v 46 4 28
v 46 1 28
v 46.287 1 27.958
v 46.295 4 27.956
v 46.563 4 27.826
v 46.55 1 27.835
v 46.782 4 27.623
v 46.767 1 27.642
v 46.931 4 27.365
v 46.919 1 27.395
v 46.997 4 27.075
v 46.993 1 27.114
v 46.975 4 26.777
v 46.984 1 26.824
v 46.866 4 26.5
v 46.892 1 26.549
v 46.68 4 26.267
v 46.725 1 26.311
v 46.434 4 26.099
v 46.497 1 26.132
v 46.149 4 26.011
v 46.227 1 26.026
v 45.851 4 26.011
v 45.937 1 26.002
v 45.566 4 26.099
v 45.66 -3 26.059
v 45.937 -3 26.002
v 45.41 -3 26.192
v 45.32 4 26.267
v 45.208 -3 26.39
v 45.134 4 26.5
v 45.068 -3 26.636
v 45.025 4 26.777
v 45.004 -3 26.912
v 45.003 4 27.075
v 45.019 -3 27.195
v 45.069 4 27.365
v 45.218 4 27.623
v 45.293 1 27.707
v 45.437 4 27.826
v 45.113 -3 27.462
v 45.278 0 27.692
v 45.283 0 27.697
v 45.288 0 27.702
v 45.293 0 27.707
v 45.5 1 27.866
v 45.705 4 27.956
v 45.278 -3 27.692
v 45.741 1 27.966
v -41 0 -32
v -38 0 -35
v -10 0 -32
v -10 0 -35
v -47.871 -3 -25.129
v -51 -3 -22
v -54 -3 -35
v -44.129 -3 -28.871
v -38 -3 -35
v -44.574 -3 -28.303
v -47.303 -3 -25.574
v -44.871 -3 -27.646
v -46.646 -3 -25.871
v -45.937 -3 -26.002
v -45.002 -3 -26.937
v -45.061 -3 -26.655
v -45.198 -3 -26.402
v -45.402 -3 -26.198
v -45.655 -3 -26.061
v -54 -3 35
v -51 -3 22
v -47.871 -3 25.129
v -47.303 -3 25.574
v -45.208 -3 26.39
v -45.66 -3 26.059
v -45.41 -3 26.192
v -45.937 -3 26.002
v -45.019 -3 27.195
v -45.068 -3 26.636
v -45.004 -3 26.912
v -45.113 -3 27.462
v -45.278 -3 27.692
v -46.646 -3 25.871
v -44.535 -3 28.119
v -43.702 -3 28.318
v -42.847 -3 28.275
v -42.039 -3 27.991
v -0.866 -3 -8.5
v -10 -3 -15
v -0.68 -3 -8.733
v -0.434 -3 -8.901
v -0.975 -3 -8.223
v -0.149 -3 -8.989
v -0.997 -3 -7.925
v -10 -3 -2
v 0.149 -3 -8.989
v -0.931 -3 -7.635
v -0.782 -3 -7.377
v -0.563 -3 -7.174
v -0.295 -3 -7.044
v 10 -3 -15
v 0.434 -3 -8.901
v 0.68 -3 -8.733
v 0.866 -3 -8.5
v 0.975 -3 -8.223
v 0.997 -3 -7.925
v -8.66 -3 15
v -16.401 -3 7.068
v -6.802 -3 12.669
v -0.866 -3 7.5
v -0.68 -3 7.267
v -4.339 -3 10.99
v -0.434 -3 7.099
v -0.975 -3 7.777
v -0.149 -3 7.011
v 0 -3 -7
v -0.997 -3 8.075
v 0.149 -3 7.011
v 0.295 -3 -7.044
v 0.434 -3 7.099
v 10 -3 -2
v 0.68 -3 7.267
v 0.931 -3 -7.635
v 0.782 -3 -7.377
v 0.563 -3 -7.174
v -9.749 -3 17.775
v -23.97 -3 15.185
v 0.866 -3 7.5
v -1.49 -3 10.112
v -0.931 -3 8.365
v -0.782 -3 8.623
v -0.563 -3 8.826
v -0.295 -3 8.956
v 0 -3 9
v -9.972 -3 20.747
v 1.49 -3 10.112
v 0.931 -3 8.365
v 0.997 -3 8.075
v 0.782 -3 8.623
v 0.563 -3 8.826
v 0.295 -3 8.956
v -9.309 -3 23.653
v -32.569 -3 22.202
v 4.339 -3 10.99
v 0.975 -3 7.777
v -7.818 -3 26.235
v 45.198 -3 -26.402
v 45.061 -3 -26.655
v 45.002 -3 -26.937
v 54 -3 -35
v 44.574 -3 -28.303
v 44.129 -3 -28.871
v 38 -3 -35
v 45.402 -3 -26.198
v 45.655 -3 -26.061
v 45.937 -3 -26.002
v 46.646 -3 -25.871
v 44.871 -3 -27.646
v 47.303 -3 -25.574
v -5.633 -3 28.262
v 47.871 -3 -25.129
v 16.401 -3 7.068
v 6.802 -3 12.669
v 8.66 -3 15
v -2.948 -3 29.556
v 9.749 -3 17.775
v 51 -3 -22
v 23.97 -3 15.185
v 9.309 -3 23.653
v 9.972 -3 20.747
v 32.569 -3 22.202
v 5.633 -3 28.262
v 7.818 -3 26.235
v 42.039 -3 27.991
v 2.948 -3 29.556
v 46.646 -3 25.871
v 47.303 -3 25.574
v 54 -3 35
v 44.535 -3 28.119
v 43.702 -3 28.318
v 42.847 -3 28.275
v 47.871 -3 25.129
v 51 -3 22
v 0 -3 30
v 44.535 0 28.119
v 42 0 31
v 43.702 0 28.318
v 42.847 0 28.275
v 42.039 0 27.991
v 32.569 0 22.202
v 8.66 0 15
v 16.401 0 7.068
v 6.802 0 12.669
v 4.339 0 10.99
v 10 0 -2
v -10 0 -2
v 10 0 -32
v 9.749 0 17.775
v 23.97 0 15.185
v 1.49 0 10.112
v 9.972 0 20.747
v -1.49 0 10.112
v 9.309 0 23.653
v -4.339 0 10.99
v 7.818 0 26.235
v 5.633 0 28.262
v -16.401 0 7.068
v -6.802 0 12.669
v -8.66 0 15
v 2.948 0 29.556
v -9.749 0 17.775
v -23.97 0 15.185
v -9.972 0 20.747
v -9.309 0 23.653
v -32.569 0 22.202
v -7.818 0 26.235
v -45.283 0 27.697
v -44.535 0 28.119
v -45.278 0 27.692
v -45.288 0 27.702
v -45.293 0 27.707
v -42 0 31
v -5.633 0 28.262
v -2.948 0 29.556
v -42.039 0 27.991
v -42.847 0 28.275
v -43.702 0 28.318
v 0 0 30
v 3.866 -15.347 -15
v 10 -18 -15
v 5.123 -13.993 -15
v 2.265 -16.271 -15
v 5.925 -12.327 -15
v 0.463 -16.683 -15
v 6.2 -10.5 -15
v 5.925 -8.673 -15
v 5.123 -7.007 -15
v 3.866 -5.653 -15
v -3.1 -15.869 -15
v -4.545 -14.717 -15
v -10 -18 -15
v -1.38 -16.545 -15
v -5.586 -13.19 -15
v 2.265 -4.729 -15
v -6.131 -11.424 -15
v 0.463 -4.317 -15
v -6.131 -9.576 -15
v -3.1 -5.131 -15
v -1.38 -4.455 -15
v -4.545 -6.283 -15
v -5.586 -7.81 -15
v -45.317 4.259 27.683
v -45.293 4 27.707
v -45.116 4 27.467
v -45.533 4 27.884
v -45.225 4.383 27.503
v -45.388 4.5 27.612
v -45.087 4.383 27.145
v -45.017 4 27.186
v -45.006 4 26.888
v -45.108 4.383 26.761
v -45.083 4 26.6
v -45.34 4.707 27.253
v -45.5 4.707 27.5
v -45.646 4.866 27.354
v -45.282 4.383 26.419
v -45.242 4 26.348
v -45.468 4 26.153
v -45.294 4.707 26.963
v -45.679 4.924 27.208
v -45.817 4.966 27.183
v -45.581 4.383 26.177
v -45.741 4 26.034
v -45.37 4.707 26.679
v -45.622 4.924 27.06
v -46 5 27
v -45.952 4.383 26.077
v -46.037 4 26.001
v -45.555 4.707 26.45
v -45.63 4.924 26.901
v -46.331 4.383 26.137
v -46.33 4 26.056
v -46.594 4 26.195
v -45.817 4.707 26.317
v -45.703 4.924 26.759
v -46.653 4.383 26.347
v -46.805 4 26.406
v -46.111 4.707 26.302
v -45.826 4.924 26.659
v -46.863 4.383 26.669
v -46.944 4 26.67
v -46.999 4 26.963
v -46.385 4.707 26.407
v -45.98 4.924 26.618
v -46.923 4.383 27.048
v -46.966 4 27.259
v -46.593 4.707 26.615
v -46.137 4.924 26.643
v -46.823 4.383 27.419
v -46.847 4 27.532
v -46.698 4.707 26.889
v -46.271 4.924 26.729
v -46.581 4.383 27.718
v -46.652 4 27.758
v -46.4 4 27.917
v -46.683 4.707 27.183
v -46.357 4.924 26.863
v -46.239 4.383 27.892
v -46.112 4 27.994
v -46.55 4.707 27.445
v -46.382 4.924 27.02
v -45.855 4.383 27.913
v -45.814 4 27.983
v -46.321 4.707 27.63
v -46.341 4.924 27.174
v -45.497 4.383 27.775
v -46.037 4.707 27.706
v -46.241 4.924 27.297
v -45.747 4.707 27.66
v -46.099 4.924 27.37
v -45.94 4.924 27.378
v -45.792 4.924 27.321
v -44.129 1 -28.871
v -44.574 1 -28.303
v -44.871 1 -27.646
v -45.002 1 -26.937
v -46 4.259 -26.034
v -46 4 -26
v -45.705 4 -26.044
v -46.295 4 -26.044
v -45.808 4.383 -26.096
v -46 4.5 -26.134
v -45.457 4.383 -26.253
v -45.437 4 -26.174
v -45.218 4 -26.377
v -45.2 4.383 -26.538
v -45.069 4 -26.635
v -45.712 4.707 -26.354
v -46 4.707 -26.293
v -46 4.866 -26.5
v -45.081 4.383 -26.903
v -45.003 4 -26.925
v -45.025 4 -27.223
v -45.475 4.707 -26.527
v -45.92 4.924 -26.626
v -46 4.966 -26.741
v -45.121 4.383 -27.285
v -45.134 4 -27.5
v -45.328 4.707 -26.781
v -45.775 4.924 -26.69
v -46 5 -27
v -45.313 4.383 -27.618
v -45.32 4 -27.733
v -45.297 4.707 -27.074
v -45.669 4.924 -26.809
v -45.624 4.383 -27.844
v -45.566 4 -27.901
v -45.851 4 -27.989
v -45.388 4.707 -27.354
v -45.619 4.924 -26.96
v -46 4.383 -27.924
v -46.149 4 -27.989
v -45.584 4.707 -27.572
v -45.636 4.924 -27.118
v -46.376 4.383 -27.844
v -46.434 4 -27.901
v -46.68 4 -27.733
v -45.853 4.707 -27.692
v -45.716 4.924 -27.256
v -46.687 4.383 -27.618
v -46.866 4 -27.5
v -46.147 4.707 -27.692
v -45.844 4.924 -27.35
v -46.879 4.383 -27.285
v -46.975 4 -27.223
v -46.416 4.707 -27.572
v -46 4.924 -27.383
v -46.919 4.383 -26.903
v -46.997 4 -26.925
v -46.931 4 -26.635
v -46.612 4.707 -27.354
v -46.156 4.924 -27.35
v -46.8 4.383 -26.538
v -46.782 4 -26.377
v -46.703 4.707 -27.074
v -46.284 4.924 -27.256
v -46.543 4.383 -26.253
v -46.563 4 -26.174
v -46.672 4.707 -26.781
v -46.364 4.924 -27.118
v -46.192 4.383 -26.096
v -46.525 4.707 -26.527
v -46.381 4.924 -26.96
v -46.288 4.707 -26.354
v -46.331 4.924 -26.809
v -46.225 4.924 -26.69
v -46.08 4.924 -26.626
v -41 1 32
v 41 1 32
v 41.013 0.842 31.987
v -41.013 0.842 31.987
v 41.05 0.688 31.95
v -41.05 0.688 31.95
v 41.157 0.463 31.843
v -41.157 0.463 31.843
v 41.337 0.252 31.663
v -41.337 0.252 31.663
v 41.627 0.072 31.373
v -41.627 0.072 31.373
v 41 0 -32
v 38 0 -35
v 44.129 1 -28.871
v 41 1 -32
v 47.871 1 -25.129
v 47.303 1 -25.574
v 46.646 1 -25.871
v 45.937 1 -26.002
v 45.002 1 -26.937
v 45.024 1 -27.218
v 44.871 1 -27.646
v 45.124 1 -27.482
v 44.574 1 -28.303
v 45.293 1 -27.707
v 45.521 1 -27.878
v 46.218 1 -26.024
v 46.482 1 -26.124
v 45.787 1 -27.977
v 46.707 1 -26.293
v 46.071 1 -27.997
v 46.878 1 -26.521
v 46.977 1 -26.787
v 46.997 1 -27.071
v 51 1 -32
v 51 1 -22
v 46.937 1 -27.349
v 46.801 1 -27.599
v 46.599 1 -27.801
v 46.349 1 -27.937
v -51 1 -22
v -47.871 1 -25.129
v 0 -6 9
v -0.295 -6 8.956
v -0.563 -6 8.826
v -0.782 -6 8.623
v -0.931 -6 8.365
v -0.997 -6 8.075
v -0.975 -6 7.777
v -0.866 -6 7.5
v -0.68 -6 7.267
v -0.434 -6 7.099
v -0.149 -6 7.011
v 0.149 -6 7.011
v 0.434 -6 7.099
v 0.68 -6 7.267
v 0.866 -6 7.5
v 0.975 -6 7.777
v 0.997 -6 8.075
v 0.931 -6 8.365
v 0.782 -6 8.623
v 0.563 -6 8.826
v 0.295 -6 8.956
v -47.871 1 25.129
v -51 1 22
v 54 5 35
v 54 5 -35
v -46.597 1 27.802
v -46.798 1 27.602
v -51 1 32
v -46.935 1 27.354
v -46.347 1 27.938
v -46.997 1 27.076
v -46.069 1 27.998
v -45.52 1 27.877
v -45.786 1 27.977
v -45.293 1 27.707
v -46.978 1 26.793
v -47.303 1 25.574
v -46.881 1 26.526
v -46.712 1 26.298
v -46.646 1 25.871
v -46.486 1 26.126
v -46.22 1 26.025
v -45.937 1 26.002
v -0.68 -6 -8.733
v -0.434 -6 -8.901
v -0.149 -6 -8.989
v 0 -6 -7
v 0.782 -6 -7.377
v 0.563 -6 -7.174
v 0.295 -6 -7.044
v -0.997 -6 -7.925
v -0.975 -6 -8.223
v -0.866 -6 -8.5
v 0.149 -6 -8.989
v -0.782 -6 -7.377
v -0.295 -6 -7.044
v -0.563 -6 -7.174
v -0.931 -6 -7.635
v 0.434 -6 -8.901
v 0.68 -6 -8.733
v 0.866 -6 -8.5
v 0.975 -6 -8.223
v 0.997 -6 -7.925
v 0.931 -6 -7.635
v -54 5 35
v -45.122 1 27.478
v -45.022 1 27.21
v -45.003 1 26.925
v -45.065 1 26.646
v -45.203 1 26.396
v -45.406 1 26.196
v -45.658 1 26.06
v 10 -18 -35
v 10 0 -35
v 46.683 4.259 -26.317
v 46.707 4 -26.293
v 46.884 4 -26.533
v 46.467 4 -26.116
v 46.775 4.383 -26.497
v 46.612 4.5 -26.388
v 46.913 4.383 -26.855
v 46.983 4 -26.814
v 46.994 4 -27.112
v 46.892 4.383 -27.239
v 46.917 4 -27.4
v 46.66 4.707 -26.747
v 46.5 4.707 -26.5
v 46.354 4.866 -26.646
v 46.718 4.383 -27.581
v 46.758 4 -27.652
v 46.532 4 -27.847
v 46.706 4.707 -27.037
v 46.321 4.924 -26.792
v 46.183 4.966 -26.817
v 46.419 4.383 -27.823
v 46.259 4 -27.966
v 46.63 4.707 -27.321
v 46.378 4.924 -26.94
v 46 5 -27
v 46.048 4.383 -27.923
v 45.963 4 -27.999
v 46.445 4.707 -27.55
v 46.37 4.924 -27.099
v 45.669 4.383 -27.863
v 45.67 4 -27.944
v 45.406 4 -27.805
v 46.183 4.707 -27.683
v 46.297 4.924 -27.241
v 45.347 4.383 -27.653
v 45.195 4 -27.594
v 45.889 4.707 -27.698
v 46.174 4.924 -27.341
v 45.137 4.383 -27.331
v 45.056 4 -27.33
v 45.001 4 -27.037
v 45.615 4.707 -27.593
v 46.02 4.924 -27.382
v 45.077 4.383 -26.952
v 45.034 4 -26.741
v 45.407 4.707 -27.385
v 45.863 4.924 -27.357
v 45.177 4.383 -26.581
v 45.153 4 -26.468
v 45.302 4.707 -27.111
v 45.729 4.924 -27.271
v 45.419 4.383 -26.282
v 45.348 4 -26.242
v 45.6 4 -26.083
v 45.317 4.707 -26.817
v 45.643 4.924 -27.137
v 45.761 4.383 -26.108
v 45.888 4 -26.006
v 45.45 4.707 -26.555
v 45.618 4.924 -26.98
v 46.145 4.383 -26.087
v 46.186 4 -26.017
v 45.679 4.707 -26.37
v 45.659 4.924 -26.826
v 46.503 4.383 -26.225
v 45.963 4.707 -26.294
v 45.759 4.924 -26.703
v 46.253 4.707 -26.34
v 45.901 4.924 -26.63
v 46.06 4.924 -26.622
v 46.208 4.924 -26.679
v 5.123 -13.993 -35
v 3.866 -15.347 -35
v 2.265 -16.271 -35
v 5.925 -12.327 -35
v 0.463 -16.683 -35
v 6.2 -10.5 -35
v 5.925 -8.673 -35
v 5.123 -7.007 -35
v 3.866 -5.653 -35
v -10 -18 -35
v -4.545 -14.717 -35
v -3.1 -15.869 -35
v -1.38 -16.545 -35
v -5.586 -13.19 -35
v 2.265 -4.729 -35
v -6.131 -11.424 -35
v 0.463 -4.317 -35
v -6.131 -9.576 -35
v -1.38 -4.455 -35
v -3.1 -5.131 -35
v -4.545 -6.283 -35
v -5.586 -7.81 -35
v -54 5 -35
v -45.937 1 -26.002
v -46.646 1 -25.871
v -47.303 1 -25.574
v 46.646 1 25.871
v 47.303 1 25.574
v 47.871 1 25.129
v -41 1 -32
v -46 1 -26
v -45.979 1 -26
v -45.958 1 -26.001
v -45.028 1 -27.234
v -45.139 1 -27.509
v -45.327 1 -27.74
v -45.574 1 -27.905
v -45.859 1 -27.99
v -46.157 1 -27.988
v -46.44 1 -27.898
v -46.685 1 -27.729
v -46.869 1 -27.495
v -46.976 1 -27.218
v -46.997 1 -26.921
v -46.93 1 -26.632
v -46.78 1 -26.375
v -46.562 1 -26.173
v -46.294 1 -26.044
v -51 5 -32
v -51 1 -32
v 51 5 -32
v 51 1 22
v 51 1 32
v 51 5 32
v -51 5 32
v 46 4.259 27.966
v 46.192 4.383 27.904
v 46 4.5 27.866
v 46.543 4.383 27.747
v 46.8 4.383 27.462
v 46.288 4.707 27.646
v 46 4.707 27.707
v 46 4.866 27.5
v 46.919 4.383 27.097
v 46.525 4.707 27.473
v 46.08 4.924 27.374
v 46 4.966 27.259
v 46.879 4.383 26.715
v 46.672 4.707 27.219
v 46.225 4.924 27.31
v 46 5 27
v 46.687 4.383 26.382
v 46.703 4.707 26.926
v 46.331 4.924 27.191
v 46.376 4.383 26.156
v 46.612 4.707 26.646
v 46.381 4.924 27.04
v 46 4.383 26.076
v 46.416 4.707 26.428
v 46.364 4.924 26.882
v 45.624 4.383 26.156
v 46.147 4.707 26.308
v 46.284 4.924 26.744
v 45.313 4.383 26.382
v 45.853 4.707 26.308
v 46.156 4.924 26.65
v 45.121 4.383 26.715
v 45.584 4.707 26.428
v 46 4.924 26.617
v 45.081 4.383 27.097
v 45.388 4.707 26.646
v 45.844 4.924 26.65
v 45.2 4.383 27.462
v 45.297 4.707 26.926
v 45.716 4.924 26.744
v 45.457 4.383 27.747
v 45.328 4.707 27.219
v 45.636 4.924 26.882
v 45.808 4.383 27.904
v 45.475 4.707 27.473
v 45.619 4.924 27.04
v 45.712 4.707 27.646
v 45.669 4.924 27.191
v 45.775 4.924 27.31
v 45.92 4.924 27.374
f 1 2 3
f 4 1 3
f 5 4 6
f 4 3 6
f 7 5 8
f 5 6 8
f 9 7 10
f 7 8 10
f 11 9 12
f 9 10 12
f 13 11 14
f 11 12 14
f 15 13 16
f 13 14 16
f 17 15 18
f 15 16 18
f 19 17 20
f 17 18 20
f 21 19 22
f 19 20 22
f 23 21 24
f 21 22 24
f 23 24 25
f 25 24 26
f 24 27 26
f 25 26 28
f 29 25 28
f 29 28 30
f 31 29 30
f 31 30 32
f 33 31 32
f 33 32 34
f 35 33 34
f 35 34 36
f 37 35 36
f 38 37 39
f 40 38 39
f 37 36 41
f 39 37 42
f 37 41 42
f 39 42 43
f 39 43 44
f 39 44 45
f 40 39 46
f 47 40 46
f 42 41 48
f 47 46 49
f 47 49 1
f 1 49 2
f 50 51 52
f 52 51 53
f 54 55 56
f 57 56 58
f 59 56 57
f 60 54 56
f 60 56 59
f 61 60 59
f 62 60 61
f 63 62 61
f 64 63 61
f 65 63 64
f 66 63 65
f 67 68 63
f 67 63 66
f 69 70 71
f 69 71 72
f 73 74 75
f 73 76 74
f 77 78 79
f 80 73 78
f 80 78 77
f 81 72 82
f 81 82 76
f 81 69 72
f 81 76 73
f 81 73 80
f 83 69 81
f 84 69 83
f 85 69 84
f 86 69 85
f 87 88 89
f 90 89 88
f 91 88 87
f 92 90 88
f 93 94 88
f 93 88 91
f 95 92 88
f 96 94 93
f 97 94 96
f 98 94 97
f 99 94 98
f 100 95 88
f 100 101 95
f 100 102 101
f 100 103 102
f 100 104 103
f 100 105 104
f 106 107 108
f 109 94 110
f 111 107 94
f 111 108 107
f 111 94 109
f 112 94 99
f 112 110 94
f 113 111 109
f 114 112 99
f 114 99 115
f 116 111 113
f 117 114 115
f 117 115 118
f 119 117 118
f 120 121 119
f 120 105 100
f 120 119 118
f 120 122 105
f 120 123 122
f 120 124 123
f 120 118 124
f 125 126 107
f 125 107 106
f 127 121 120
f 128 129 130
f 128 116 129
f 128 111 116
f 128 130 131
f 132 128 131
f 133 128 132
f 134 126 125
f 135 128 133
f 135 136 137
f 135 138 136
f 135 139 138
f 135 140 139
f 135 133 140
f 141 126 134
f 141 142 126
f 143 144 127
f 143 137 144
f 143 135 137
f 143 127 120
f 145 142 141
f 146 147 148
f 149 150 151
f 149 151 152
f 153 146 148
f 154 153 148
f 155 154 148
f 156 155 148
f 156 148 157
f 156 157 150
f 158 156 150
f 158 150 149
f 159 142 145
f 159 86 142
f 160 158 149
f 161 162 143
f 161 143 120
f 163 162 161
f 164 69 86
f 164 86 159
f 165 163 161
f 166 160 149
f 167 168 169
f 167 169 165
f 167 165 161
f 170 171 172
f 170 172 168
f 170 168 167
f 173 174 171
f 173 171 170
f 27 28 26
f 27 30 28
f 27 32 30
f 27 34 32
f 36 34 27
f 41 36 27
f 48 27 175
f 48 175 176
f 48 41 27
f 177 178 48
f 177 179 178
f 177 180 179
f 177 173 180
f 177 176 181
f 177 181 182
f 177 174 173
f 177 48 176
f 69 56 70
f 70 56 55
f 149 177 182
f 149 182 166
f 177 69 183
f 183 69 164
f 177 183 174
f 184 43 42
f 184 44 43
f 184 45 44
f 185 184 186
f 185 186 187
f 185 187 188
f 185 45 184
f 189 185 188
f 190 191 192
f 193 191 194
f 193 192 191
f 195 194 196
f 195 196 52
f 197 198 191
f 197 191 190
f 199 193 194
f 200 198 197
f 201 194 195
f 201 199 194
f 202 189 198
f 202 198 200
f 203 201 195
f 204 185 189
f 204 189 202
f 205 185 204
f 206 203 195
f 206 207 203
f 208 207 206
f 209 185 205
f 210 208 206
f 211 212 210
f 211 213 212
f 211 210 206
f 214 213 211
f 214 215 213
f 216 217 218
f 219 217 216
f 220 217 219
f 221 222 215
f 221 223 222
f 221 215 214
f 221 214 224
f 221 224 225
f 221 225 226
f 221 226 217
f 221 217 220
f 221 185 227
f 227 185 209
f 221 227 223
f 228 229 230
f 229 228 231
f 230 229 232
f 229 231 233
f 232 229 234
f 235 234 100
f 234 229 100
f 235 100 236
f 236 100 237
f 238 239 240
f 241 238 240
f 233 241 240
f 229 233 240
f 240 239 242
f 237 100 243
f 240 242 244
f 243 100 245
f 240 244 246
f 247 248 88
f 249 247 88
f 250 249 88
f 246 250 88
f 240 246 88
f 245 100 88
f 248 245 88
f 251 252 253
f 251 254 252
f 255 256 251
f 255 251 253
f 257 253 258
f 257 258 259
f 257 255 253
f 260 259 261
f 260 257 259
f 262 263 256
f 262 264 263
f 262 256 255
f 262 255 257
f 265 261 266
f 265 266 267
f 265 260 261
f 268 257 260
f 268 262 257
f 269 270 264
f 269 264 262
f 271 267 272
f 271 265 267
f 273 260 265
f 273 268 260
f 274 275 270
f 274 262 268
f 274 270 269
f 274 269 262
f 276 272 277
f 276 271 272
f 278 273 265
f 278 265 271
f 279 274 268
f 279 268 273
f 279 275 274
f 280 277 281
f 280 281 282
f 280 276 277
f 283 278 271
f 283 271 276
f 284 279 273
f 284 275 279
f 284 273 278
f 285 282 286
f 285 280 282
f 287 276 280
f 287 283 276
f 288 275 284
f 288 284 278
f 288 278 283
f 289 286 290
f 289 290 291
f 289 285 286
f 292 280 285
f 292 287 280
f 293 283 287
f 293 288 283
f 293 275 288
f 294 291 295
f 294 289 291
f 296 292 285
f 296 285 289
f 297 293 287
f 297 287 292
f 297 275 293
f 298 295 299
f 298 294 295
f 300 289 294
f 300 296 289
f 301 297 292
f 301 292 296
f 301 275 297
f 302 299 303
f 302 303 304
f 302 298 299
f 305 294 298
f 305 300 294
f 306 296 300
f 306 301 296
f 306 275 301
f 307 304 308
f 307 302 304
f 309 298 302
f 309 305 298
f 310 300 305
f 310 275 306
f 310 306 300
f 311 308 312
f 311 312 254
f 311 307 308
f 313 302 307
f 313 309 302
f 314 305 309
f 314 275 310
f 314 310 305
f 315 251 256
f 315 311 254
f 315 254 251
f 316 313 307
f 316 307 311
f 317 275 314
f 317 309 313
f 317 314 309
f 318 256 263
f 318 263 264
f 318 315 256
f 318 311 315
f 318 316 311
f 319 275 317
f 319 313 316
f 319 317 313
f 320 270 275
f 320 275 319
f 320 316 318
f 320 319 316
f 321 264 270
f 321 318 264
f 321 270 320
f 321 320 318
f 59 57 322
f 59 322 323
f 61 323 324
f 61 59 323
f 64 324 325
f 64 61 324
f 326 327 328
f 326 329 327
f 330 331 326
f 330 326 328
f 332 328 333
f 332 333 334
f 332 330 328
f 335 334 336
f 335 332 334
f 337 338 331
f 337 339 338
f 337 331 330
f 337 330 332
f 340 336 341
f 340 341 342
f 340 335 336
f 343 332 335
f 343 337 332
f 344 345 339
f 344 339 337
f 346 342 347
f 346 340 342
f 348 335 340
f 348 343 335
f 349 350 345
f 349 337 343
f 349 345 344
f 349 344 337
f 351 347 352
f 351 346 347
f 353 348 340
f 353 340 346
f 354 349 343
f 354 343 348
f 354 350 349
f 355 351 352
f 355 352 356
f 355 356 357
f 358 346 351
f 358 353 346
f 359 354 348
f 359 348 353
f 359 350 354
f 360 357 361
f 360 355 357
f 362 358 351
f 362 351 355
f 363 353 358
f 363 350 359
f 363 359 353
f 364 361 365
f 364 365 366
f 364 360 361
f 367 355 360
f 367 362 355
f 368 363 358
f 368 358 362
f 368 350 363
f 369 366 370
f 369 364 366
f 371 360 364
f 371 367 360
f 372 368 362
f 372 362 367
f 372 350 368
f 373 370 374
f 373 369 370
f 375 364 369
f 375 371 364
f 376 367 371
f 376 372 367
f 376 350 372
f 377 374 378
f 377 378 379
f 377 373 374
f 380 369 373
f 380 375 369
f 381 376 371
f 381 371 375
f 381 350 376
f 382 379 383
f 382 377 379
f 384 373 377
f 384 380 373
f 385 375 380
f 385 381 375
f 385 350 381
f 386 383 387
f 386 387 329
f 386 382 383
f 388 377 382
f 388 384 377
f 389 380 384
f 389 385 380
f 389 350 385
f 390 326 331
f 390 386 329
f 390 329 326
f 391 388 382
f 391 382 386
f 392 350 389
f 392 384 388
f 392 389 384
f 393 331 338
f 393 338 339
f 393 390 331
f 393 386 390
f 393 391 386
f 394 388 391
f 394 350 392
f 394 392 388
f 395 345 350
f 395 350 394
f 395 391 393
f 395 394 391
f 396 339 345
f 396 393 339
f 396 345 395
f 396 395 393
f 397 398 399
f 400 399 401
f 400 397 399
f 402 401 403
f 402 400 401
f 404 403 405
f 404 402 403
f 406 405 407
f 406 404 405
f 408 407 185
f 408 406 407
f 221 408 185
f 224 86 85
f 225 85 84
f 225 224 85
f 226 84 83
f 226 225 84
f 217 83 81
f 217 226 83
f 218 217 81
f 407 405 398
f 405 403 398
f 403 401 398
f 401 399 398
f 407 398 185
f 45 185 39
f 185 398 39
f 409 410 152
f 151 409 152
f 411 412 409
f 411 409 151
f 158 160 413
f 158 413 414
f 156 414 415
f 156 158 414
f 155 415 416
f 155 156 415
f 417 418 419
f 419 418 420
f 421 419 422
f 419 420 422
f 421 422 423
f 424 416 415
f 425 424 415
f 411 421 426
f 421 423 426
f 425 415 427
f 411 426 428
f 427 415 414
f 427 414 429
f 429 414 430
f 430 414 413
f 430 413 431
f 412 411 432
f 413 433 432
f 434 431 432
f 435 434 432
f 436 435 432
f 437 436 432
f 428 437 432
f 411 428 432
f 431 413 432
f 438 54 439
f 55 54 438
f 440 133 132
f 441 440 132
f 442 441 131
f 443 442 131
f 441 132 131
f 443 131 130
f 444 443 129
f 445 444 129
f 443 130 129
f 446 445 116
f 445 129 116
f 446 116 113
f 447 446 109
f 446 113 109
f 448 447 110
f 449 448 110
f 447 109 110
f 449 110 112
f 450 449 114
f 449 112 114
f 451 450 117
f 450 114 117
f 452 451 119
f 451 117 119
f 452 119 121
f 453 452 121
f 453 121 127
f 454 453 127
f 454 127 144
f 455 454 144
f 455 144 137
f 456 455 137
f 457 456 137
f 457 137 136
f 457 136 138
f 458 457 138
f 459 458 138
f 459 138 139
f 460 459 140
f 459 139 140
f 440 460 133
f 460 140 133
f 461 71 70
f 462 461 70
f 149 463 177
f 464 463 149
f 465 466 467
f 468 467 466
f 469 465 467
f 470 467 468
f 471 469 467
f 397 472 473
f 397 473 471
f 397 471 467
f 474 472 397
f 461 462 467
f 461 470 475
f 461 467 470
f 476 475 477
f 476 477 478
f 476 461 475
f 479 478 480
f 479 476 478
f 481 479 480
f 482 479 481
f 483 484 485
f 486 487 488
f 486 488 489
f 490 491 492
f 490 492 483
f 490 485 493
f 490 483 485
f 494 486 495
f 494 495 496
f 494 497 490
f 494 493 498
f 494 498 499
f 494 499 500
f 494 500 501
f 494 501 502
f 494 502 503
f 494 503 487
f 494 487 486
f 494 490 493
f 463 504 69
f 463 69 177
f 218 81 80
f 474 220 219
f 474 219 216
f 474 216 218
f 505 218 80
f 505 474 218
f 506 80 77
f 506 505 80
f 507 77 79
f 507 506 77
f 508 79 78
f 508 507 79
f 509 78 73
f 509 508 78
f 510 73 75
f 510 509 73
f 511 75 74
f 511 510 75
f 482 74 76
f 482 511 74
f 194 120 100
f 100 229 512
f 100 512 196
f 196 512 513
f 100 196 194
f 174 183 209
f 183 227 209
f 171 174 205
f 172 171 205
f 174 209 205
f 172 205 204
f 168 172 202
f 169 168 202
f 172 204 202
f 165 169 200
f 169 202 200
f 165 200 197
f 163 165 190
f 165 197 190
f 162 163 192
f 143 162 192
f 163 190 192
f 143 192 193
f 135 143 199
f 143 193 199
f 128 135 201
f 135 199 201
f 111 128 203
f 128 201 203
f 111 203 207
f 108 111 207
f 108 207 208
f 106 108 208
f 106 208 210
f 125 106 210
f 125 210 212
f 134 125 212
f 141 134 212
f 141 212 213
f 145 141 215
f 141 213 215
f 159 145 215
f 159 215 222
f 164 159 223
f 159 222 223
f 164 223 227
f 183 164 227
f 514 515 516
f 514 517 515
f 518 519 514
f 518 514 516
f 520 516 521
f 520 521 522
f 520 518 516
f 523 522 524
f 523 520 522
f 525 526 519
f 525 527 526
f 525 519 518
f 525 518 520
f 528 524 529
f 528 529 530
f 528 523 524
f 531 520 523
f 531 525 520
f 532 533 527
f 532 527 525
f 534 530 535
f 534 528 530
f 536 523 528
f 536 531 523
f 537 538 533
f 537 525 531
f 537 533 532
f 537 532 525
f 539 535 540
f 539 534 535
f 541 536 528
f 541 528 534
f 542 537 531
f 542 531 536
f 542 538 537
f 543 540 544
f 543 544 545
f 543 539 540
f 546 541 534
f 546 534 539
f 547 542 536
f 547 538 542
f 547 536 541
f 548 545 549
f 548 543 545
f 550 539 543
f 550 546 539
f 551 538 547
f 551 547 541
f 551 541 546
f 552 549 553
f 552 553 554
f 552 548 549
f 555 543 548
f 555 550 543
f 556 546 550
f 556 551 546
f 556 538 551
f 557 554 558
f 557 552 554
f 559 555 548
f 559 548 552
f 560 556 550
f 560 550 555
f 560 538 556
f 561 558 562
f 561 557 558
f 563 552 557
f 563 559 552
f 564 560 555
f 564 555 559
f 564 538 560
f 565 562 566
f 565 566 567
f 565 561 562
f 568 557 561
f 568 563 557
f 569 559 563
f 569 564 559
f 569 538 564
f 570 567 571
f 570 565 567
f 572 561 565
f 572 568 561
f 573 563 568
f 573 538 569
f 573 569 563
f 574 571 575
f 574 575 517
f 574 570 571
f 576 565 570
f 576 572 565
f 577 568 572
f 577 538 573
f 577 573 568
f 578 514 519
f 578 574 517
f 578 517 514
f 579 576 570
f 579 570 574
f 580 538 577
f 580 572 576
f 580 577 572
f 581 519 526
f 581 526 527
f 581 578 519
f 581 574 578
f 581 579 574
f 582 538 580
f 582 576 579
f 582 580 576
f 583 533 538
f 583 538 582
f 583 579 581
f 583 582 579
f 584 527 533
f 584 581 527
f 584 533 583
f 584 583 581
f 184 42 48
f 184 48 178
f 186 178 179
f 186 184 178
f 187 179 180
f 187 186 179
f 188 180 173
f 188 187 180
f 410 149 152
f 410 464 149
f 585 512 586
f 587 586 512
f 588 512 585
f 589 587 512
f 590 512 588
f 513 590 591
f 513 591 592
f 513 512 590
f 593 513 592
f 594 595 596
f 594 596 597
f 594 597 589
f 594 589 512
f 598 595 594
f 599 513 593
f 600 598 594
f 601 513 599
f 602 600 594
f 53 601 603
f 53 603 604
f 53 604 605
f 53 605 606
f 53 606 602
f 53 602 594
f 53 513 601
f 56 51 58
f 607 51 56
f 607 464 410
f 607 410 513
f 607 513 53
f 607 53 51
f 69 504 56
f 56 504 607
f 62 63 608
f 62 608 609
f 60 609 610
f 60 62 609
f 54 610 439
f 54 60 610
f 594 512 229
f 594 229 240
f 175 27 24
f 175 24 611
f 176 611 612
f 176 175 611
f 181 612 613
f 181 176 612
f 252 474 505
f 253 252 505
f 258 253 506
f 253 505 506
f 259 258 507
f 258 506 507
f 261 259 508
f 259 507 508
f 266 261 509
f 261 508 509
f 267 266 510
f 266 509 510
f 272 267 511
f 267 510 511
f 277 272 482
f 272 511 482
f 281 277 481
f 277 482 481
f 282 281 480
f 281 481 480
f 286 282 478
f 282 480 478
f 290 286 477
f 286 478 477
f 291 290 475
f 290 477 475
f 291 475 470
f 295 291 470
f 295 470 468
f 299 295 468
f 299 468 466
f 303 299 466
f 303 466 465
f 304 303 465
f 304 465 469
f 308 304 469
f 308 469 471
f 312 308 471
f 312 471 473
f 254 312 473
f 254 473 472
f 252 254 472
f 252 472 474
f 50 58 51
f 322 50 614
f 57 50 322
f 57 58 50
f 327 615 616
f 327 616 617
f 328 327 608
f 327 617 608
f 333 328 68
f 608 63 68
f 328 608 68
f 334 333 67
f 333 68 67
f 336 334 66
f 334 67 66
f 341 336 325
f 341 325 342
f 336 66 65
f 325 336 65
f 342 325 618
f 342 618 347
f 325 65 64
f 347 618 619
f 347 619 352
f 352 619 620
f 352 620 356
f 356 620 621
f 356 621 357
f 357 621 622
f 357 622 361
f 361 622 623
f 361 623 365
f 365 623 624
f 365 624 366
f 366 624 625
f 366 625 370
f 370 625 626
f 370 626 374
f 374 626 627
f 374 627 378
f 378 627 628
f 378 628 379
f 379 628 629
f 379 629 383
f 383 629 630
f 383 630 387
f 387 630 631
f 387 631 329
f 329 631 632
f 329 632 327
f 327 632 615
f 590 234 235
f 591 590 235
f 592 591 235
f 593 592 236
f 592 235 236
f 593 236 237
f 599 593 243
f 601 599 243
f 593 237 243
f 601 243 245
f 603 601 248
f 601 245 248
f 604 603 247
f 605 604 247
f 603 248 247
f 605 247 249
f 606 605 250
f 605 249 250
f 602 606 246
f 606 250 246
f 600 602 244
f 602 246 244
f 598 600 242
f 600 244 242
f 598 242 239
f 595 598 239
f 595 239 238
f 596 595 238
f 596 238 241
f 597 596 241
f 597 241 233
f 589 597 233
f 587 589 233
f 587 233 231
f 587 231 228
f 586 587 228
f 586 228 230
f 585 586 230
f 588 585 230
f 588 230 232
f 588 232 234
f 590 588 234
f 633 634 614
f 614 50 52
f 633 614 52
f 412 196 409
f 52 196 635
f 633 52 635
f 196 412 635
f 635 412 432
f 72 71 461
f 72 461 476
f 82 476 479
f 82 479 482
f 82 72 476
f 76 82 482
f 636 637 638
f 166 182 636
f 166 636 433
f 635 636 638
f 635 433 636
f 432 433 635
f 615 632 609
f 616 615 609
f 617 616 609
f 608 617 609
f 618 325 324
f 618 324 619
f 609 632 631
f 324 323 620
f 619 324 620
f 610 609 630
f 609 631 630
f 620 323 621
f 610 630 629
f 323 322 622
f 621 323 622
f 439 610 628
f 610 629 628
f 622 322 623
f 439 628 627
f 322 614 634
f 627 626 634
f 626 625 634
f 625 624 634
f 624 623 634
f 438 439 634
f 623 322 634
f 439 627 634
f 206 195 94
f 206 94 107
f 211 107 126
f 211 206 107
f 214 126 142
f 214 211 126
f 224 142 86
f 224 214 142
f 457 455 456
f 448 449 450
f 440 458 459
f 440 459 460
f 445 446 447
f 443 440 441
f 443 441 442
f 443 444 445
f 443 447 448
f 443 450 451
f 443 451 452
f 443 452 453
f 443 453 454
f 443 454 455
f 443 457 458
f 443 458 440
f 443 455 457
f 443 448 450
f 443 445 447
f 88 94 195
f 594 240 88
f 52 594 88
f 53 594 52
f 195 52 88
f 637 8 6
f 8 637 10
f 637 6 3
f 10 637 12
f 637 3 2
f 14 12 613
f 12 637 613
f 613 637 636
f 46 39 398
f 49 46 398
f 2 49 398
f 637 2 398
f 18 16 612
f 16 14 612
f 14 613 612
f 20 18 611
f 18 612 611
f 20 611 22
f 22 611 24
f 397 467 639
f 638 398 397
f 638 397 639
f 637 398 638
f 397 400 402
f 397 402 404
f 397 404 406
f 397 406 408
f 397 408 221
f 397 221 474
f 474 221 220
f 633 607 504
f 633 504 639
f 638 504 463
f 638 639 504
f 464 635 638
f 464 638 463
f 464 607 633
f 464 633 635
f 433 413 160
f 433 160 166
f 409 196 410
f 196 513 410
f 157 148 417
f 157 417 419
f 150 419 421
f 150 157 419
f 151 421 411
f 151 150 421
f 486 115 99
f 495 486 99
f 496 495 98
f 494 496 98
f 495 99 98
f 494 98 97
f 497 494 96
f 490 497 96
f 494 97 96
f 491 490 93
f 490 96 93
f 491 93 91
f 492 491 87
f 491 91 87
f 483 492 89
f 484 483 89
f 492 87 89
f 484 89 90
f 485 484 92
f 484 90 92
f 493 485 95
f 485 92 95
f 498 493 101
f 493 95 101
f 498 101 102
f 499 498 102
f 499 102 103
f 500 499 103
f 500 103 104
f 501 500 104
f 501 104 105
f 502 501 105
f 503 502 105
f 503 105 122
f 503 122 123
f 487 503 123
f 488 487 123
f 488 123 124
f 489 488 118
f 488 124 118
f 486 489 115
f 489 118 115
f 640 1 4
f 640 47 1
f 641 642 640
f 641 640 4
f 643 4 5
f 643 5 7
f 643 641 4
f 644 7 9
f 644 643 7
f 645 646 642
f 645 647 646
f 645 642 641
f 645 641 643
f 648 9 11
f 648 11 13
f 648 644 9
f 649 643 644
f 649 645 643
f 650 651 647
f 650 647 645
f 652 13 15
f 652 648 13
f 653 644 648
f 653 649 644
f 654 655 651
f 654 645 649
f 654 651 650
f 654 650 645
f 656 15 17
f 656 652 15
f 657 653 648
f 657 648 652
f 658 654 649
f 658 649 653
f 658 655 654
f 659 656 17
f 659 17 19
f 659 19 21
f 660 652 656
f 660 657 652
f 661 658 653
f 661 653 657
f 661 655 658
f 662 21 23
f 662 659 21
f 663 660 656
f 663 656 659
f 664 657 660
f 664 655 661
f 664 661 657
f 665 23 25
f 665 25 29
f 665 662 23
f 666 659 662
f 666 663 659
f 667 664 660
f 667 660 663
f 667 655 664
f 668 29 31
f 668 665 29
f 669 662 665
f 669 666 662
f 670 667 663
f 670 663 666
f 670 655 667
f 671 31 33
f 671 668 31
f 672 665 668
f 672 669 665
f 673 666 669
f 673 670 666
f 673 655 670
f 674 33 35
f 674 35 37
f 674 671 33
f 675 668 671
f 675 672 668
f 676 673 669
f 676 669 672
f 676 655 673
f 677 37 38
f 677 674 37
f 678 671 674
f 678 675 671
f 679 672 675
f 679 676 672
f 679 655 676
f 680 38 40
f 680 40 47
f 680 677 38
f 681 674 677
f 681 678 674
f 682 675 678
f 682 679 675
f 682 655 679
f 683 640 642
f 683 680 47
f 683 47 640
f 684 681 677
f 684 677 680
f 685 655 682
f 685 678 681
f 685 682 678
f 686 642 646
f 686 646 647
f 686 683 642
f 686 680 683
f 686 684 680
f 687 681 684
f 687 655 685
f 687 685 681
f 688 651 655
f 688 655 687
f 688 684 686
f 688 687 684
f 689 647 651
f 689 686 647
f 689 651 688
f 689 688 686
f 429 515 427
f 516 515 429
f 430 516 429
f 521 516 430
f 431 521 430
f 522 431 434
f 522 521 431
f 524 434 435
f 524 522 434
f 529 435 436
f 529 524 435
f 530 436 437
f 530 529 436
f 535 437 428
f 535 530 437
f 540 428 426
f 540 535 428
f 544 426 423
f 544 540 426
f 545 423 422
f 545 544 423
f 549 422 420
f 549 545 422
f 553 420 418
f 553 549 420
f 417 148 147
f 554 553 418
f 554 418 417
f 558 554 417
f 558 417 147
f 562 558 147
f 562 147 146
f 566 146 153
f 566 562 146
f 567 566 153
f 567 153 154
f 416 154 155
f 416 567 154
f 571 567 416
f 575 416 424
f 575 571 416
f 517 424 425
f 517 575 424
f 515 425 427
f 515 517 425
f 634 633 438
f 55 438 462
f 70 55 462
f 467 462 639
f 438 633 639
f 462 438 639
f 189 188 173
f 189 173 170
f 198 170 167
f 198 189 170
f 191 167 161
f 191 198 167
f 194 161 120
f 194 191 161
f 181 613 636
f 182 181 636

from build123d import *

# Parameters (mm, degrees)
SKETCH_1_W          = 108
SKETCH_1_H          = 70
SKETCH_1_W_2        = 102
SKETCH_1_H_2        = 64
EXTRUDE_1_DEPTH     = 5
EXTRUDE_8_DEPTH     = 3
SKETCH_4_W          = 20
SKETCH_4_H          = 18
EXTRUDE_9_DEPTH     = 20
SKETCH_5_R          = 6.2
CUT_EXTRUDE_1_DEPTH = 76.7627877
FILLET_2_R          = 1
EXTRUDE_10_DEPTH    = 1
EXTRUDE_11_DEPTH    = 3
FILLET_3_R          = 3
SKETCH_8_R          = 10
CUT_EXTRUDE_2_DEPTH = 5
SKETCH_9_R          = 1
EXTRUDE_12_DEPTH    = 4
FILLET_4_R          = 3
FILLET_5_R          = 1
EXTRUDE_13_DEPTH    = 3
SKETCH_12_R         = 1
EXTRUDE_15_DEPTH    = 3


with BuildPart() as part:
    # 草图1 → 凸台-拉伸1 (new body)
    with BuildSketch(Plane(origin=(0, 0, 0), x_dir=(1, 0, 0), z_dir=(0, 1, 0))):
        Rectangle(SKETCH_1_W, SKETCH_1_H)
        Rectangle(SKETCH_1_W_2, SKETCH_1_H_2, mode=Mode.SUBTRACT)
    extrude(amount=EXTRUDE_1_DEPTH)

    # 草图3 → 凸台-拉伸8 (add)
    with BuildSketch(Plane.XZ):
        with BuildLine():
            Line((10, -35), (-10, -35))
            Line((-10, -35), (-10, -2))
            ThreePointArc((-10, -2), (-28.889417714, 19.435738798), (-54, 33.065106234))
            Line((-54, 33.065106234), (-54, 35))
            Line((-54, 35), (54, 35))
            Line((54, 35), (54, 33.065106234))
            ThreePointArc((54, 33.065106234), (28.889417714, 19.435738798), (10, -2))
            Line((10, -2), (10, -35))
        make_face()
    extrude(amount=EXTRUDE_8_DEPTH)

    # 草图4 → 凸台-拉伸9 (add)
    with BuildSketch(Plane(origin=(0, 0, -35), x_dir=(-1, 0, 0), z_dir=(0, 0, -1))):
        with Locations((0, -9)):
            Rectangle(SKETCH_4_W, SKETCH_4_H)
    extrude(amount=-EXTRUDE_9_DEPTH)

    # 草图5 → 切除-拉伸1 (cut, through all)
    with BuildSketch(Plane.XY.offset(-15)):
        with Locations((0, -10.5)):
            Circle(SKETCH_5_R)
    extrude(amount=-CUT_EXTRUDE_1_DEPTH, mode=Mode.SUBTRACT)

    # 圆角2
    # the kernel refuses this fillet: 1 mm, written as the material it adds along each edge
    with BuildSketch(Plane(origin=(-53.5, 0, 32), x_dir=(0, 1, 0), z_dir=(1, 0, 0))) as fillet_2_piece_1:
        with BuildLine():
            CenterArc((FILLET_2_R, -FILLET_2_R), FILLET_2_R, 90, 90)
            Line((0, -FILLET_2_R), (0, 0))
            Line((0, 0), (FILLET_2_R, 0))
        make_face()
    extrude(amount=107)

    # 草图6 → 凸台-拉伸10 (add)
    with BuildSketch(Plane(origin=(0, 0, 0), x_dir=(1, 0, 0), z_dir=(0, 1, 0))):
        Polygon((51, 32), (41, 32), (51, 22), align=None)
        Polygon((-51, 32), (-41, 32), (-51, 22), align=None)
        Polygon((-51, -22), (-51, -32), (-41, -32), align=None)
        Polygon((51, -32), (41, -32), (51, -22), align=None)
    extrude(amount=EXTRUDE_10_DEPTH)

    # 草图7 → 凸台-拉伸11 (add)
    with BuildSketch(Plane.XZ):
        Polygon((38, -35), (54, -19), (54, -35), align=None)
        Polygon((-54, -35), (-38, -35), (-54, -19), align=None)
        Polygon((54, 35), (38, 35), (54, 19), align=None)
        Polygon((-54, 35), (-38, 35), (-54, 19), align=None)
    extrude(amount=EXTRUDE_11_DEPTH)

    # 圆角3
    fillet_3_edges = [part.edges().sort_by_distance(p)[0] for p in [
        (44.013135699, -1.5, 28.986864301),
        (-44.013135699, -1.5, 28.986864301),
    ]]
    fillet(fillet_3_edges, radius=FILLET_3_R)

    # 草图8 → 切除-拉伸2 (cut, symmetric)
    with BuildSketch(Plane(origin=(0, 0, 0), x_dir=(1, 0, 0), z_dir=(0, 1, 0))):
        with Locations(Location((0, -20, 0), (0, 0, 270))):
            Circle(SKETCH_8_R)
    extrude(amount=CUT_EXTRUDE_2_DEPTH, both=True, mode=Mode.SUBTRACT)

    # 草图9 → 凸台-拉伸12 (add, symmetric)
    with BuildSketch(Plane(origin=(0, 1, 0), x_dir=(1, 0, 0), z_dir=(0, 1, 0))):
        with Locations(Location((46, -27, 0), (0, 0, 270))):
            Circle(SKETCH_9_R)
        with Locations(Location((-46, -27, 0), (0, 0, 315))):
            Circle(SKETCH_9_R)
        with Locations(Location((-46, 27, 0), (0, 0, 270))):
            Circle(SKETCH_9_R)
        with Locations(Location((46, 27, 0), (0, 0, 315))):
            Circle(SKETCH_9_R)
    extrude(amount=EXTRUDE_12_DEPTH, both=True)

    # 圆角4
    # the kernel refuses this fillet: 3 mm, written as the material it adds along each edge
    with BuildSketch(Plane(origin=(46.707106781, -3, 26.292893219), x_dir=(0.7071067811865442, 0, -0.7071067811865508), z_dir=(0, 1, 0)), Plane(origin=(-46.707106781, -3, -26.292893219), x_dir=(-0.7071067811865422, 0, 0.707106781186553), z_dir=(0, 1, 0))) as fillet_4_piece_1:
        with BuildLine():
            CenterArc((1.645751311, 3), FILLET_4_R, 228.590377891, 41.409622109)
            ThreePointArc((-0.338562172, 0.75), (-0.088562172, 0.411437828), (0, 0))
            Line((0, 0), (1.645751311, 0))
        make_face()
    extrude(amount=4)
    with BuildSketch(Plane(origin=(-46.707106781, -3, 26.292893219), x_dir=(0.9354143466934858, 0, -0.3535533905932727), z_dir=(0, 1, 0))) as fillet_4_piece_2:
        with BuildLine():
            CenterArc((2.057189139, 2.734313483), FILLET_4_R, 204.295188945, 41.409622109)
            Line((-0.677124344, 1.5), (0, 0))
            ThreePointArc((0, 0), (0.411437828, 0.088562172), (0.822875656, 0))
        make_face()
    extrude(amount=4)
    with BuildSketch(Plane(origin=(-45.292893219, -3, -27.707106781), x_dir=(0.7071067811865529, 0, -0.7071067811865421), z_dir=(0, 1, 0)), Plane(origin=(46.707106781, -3, -26.292893219), x_dir=(0.7071067811865476, 0, 0.7071067811865476), z_dir=(0, 1, 0))) as fillet_4_piece_3:
        with BuildLine():
            CenterArc((1.645751311, -3), FILLET_4_R, 90, 41.409622109)
            ThreePointArc((-0.338562172, -0.75), (-0.088562172, -0.411437828), (0, 0))
            Line((0, 0), (1.645751311, 0))
        make_face()
    extrude(amount=4)
    with BuildSketch(Plane(origin=(45.292893219, -3, -27.707106781), x_dir=(-0.35355339059328167, 0, 0.9354143466934823), z_dir=(0, 1, 0))) as fillet_4_piece_4:
        with BuildLine():
            CenterArc((2.057189139, -2.734313483), FILLET_4_R, 114.295188945, 41.409622109)
            Line((-0.677124344, -1.5), (0, 0))
            ThreePointArc((0, 0), (0.411437828, -0.088562172), (0.822875656, 0))
        make_face()
    extrude(amount=4)

    # 圆角5
    fillet_5_edges = [part.edges().sort_by_distance(p)[0] for p in [
        (46, 5, 26),
        (-46.707106781, 5, 26.292893219),
        (-46, 5, -28),
        (45.292893219, 5, -27.707106781),
    ]]
    fillet(fillet_5_edges, radius=FILLET_5_R)

    # 草图10 → 凸台-拉伸13 (add)
    with BuildSketch(Plane.XZ):
        Polygon((-51, 22), (-54, 19), (-54, -19), (-51, -22), align=None)
        Polygon((54, -19), (51, -22), (51, 22), (54, 19), align=None)
    extrude(amount=EXTRUDE_13_DEPTH)

    # 草图12 → 凸台-拉伸15 (add)
    with BuildSketch(Plane.XZ.offset(3)):
        with Locations(Location((0, -8, 0), (0, 0, 90))):
            Circle(SKETCH_12_R)
        with Locations(Location((0, 8, 0), (0, 0, 90))):
            Circle(SKETCH_12_R)
    extrude(amount=EXTRUDE_15_DEPTH)


solid = part.part
